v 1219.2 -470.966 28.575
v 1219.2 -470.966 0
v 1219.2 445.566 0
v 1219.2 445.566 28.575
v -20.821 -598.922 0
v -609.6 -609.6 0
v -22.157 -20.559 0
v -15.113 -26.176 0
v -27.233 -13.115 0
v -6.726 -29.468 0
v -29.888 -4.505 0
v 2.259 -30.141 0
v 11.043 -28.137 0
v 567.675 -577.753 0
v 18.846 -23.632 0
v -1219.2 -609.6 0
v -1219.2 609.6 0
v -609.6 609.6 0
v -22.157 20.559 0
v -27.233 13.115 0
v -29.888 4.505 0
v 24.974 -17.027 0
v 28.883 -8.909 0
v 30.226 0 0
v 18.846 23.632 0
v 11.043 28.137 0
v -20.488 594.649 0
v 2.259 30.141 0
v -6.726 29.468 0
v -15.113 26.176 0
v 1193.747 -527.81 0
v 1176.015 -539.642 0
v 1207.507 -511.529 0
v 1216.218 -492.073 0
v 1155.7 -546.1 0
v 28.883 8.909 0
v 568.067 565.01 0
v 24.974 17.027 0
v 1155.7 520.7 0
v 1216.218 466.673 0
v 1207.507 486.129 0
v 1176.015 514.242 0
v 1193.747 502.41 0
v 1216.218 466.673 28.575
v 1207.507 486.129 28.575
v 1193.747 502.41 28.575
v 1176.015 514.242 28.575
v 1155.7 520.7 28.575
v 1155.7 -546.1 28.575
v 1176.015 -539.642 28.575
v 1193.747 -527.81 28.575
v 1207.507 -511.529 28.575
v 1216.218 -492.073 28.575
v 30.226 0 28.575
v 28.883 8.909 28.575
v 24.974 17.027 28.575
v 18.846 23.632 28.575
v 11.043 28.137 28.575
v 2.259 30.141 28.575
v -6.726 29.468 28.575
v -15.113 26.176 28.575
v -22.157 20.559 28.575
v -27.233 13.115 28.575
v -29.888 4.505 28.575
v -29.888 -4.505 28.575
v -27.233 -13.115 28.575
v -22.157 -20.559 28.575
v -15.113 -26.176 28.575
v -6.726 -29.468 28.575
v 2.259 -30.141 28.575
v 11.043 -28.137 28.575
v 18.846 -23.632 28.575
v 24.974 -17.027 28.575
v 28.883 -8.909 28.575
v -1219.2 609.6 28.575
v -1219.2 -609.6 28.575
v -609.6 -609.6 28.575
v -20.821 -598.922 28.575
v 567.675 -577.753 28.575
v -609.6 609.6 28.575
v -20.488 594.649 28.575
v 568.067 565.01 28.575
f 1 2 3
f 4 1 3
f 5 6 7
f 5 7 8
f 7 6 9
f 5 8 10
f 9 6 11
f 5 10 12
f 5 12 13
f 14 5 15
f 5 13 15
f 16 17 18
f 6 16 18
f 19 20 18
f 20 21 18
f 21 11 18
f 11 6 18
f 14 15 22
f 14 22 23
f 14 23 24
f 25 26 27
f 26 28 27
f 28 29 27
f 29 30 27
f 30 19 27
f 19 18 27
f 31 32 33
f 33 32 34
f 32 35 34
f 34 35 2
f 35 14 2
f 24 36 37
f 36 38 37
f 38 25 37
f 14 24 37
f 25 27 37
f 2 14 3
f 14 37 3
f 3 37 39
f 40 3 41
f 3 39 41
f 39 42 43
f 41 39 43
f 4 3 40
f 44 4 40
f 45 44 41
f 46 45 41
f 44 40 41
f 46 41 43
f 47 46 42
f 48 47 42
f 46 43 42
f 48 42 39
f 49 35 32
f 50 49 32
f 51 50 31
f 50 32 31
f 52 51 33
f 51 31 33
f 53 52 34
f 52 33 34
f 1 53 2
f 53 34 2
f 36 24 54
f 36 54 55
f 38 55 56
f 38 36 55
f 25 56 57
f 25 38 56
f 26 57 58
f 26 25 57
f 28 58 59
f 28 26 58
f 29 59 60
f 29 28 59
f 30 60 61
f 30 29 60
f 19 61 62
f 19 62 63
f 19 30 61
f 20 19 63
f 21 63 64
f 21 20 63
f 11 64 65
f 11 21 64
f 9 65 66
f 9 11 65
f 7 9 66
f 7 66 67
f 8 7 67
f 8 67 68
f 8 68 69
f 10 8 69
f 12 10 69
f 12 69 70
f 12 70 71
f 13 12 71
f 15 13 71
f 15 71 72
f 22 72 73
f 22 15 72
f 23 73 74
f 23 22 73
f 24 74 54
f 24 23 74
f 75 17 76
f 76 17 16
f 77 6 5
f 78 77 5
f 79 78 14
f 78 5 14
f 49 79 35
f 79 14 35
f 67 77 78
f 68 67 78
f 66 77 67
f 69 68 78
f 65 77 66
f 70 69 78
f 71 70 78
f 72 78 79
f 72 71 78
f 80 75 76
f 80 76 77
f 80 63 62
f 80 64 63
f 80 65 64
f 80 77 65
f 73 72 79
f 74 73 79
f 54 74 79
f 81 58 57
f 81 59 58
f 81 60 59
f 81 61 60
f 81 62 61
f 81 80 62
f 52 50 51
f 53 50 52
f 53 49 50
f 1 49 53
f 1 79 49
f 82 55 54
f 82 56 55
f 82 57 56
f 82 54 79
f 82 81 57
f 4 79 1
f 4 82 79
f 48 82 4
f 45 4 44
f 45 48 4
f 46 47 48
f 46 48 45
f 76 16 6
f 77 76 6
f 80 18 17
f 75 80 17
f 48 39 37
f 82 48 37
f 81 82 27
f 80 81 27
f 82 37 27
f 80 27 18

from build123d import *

# Parameters (mm, degrees)
F0_R     = 30.226
F1_DEPTH = 28.575


with BuildPart() as f1:
    # F0 (on Top) → F1 (new body)
    with BuildSketch(Plane.XY):
        with BuildLine():
            Line((1219.2, -470.965787), (1219.2, 445.565831))
            ThreePointArc((1219.2, 445.565831), (1201.198829, 494.752581), (1155.700359, 520.699984))
            Line((1155.700359, 520.699984), (-1219.2, 609.6))
            Line((-1219.2, 609.6), (-1219.2, -609.6))
            Line((-1219.2, -609.6), (1155.7, -546.1))
            ThreePointArc((1155.7, -546.1), (1201.198711, -520.152675), (1219.2, -470.965787))
        make_face()
        Circle(F0_R, mode=Mode.SUBTRACT)
        with BuildLine():
            Line((-1219.2, 609.6), (1155.700359, 520.699984))
            ThreePointArc((1155.700359, 520.699984), (273.88184, 581.6644), (-609.6, 609.6))
            Line((-609.6, 609.6), (-1219.2, 609.6))
        make_face()
        with BuildLine():
            ThreePointArc((-609.6, -609.6), (273.474389, -589.648025), (1155.7, -546.1))
            Line((1155.7, -546.1), (-1219.2, -609.6))
            Line((-1219.2, -609.6), (-609.6, -609.6))
        make_face()
    extrude(amount=F1_DEPTH)


solid = f1.part
